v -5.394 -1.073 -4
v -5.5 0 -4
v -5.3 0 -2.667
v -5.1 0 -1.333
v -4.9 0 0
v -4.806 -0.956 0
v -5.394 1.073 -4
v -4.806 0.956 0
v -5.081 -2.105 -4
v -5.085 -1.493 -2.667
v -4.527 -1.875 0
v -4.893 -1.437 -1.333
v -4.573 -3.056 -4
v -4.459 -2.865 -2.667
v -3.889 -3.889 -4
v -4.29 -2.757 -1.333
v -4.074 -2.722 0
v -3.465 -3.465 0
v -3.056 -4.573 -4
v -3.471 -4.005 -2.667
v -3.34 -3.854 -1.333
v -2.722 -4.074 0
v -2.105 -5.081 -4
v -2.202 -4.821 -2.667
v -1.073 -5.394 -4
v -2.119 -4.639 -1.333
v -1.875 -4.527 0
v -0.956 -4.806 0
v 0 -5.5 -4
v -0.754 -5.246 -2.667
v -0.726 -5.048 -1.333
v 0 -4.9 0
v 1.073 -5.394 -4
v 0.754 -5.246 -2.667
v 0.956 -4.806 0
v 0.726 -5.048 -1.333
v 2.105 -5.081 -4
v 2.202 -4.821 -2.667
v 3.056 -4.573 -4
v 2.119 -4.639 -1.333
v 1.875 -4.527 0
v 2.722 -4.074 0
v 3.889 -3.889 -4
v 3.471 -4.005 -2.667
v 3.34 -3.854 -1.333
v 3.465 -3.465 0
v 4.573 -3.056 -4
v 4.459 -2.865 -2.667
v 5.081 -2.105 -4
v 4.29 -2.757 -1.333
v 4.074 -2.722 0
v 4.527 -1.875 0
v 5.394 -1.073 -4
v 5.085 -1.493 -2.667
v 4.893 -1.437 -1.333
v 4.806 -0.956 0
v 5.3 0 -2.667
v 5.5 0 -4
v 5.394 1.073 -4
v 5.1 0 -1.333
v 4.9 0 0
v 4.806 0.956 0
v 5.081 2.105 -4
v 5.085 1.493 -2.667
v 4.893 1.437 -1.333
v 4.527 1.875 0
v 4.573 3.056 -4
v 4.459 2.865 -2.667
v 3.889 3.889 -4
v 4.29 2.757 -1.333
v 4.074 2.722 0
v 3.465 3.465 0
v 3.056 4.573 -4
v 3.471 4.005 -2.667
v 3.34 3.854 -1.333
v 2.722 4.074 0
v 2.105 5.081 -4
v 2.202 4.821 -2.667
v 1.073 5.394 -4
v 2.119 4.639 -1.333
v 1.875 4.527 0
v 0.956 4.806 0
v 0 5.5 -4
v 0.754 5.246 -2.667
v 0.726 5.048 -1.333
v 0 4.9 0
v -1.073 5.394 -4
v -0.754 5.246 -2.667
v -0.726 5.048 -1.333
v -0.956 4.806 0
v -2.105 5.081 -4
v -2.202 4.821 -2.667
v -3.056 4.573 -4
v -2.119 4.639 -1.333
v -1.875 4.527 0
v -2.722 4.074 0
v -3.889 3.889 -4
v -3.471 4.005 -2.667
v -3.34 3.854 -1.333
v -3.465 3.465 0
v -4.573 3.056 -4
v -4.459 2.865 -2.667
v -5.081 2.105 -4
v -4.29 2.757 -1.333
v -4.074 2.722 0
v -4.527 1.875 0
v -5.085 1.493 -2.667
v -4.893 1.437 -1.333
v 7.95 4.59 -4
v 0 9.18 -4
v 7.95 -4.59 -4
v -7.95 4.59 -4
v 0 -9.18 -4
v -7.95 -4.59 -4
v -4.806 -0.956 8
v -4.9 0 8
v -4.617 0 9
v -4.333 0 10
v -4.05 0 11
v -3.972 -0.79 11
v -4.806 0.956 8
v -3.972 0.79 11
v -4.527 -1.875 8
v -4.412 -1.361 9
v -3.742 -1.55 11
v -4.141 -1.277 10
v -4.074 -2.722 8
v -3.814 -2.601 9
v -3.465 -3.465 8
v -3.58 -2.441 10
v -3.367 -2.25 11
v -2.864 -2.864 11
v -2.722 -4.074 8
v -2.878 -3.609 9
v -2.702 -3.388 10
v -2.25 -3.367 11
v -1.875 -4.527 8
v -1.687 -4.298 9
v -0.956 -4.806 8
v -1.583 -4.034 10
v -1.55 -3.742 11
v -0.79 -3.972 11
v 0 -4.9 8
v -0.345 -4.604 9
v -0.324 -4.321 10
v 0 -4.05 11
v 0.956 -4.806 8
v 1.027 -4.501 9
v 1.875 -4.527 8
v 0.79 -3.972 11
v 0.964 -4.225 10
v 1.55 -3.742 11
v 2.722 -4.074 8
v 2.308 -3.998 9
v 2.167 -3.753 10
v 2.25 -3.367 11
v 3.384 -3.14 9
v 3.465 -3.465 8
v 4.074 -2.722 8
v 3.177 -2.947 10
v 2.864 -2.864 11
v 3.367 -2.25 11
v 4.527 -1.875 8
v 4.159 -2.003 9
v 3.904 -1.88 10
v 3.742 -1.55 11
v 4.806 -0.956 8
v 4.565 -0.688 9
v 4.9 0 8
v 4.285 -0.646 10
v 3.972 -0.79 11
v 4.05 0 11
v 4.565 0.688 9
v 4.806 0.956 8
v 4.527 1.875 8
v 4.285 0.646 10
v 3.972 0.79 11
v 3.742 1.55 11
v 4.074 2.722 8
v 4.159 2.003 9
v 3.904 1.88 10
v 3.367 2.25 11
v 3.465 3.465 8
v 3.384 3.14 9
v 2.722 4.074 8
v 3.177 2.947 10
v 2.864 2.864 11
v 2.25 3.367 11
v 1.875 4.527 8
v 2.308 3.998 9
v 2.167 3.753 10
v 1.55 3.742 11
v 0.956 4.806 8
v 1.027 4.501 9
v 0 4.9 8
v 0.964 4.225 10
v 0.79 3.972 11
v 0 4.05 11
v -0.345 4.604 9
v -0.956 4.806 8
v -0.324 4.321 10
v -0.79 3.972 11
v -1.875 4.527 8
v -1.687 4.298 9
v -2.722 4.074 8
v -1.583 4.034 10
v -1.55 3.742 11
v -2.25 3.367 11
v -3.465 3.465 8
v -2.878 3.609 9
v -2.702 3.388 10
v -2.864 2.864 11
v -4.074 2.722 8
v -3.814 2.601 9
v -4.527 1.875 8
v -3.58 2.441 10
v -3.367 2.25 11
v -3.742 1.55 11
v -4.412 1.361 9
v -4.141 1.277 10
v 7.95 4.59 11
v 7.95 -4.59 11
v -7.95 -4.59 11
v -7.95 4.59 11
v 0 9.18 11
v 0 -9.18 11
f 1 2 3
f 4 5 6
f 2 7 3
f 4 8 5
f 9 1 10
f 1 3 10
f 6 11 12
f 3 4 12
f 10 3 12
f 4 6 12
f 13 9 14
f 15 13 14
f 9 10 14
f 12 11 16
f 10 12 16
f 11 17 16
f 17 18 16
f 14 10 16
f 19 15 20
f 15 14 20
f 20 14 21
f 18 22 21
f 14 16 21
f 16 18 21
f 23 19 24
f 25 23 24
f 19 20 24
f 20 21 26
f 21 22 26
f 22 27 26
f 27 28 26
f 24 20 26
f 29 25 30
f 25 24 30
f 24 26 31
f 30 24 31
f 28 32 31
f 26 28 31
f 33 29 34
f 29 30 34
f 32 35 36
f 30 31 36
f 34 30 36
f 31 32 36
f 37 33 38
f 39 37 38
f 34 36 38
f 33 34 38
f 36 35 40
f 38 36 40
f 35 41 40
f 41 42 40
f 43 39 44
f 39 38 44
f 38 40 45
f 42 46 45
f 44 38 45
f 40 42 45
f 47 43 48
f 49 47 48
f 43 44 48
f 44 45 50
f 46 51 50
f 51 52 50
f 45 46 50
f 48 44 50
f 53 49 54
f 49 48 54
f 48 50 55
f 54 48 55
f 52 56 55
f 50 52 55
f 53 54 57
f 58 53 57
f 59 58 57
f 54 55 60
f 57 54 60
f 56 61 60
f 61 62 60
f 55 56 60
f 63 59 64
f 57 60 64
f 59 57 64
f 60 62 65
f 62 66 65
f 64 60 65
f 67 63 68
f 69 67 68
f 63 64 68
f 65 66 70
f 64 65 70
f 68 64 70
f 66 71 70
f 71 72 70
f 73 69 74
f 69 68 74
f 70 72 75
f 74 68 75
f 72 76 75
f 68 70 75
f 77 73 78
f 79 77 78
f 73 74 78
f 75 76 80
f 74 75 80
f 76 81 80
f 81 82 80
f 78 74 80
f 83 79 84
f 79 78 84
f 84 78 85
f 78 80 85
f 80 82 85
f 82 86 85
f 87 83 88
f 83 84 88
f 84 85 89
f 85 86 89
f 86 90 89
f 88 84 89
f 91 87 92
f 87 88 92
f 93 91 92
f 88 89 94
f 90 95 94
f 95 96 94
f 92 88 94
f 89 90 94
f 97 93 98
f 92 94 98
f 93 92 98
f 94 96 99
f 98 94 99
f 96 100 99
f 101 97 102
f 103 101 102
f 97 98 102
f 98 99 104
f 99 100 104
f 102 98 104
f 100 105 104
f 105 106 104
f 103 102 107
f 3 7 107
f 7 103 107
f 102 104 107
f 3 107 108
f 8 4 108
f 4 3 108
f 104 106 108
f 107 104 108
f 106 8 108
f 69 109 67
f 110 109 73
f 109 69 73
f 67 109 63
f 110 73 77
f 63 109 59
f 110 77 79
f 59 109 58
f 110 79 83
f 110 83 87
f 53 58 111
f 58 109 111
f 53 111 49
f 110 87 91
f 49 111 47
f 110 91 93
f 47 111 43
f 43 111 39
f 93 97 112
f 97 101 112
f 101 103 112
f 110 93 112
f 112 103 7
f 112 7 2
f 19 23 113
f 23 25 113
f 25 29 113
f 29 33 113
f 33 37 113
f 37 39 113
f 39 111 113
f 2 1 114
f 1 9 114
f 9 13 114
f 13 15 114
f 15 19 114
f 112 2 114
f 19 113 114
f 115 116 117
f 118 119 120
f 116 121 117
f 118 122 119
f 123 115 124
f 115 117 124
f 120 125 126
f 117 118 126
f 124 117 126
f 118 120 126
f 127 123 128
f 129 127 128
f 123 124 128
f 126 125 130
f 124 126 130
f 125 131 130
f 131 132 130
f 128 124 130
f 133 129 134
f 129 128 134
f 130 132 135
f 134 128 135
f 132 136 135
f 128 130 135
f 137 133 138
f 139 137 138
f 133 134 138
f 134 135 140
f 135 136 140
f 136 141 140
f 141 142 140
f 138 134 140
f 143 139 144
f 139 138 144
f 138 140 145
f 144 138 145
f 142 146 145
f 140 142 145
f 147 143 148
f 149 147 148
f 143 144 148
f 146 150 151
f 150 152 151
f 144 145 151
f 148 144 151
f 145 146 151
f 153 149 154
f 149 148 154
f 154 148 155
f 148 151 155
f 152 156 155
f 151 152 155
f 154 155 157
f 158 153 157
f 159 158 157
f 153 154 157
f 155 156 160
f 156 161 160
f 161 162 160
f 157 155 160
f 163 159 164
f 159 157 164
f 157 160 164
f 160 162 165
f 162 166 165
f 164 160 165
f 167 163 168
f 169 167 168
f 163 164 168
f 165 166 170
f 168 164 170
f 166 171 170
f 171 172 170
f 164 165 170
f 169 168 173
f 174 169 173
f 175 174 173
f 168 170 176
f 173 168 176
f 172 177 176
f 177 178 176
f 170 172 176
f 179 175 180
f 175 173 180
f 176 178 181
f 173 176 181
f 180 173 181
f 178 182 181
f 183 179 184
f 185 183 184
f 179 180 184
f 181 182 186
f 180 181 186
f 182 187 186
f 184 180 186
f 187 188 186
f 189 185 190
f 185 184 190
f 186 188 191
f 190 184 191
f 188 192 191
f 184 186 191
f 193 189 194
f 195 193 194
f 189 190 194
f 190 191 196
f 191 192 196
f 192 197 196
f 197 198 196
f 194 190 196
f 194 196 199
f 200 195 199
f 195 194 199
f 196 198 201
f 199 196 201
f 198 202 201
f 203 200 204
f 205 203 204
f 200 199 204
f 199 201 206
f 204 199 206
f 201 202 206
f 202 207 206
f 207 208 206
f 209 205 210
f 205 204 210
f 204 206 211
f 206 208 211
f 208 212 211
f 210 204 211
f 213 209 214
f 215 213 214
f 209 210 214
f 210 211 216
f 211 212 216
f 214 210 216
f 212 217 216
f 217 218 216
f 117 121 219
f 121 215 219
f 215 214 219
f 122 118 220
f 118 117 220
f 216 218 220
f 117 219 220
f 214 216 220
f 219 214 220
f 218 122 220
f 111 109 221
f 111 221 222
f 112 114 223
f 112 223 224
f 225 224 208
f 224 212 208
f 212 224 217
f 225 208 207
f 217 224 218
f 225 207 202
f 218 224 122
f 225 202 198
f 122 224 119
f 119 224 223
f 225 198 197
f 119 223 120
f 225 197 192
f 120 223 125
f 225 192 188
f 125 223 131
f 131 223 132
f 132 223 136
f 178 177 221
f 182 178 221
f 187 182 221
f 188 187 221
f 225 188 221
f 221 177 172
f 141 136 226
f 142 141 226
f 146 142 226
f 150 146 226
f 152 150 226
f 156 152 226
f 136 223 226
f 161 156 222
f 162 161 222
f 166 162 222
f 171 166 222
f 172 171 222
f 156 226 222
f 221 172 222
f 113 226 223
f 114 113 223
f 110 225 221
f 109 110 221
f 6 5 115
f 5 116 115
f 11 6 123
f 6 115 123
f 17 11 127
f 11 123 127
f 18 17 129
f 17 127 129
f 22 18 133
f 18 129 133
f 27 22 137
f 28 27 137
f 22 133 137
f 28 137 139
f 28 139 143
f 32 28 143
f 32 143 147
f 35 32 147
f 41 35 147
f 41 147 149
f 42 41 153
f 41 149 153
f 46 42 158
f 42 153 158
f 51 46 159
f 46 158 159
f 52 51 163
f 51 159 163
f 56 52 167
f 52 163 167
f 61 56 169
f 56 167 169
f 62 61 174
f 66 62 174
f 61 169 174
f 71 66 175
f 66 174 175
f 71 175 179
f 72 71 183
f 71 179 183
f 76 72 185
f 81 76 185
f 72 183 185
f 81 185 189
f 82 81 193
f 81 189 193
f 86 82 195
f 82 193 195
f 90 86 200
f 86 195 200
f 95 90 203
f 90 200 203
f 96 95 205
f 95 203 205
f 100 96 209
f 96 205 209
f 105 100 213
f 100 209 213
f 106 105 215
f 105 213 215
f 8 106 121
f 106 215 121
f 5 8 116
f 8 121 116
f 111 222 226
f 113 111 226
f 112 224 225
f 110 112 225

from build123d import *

# Parameters (mm, degrees)
F2_R     = 30
F3_DEPTH = 15.001


with BuildPart() as f1:
    # F0 (on Front) → F1 (revolve)
    with BuildSketch(Plane.XZ):
        Polygon((-5.5, -4), (-4.9, 0), (-4.9, 8), (-4.05, 11), (-4.9, 11), (-30, 11), (-30, -4), align=None)
    revolve(axis=Axis((0, 0, 7.003904), (0, 0, 1)))

    # F2 (on face) → F3 (cut, through all)
    with BuildSketch(Plane.XY.offset(11)):
        Circle(F2_R)
        Polygon((0, 9.179869), (7.95, 4.589935), (7.95, -4.589935), (0, -9.179869), (-7.95, -4.589935), (-7.95, 4.589935), align=None, mode=Mode.SUBTRACT)
    extrude(amount=-F3_DEPTH, mode=Mode.SUBTRACT)


solid = f1.part
